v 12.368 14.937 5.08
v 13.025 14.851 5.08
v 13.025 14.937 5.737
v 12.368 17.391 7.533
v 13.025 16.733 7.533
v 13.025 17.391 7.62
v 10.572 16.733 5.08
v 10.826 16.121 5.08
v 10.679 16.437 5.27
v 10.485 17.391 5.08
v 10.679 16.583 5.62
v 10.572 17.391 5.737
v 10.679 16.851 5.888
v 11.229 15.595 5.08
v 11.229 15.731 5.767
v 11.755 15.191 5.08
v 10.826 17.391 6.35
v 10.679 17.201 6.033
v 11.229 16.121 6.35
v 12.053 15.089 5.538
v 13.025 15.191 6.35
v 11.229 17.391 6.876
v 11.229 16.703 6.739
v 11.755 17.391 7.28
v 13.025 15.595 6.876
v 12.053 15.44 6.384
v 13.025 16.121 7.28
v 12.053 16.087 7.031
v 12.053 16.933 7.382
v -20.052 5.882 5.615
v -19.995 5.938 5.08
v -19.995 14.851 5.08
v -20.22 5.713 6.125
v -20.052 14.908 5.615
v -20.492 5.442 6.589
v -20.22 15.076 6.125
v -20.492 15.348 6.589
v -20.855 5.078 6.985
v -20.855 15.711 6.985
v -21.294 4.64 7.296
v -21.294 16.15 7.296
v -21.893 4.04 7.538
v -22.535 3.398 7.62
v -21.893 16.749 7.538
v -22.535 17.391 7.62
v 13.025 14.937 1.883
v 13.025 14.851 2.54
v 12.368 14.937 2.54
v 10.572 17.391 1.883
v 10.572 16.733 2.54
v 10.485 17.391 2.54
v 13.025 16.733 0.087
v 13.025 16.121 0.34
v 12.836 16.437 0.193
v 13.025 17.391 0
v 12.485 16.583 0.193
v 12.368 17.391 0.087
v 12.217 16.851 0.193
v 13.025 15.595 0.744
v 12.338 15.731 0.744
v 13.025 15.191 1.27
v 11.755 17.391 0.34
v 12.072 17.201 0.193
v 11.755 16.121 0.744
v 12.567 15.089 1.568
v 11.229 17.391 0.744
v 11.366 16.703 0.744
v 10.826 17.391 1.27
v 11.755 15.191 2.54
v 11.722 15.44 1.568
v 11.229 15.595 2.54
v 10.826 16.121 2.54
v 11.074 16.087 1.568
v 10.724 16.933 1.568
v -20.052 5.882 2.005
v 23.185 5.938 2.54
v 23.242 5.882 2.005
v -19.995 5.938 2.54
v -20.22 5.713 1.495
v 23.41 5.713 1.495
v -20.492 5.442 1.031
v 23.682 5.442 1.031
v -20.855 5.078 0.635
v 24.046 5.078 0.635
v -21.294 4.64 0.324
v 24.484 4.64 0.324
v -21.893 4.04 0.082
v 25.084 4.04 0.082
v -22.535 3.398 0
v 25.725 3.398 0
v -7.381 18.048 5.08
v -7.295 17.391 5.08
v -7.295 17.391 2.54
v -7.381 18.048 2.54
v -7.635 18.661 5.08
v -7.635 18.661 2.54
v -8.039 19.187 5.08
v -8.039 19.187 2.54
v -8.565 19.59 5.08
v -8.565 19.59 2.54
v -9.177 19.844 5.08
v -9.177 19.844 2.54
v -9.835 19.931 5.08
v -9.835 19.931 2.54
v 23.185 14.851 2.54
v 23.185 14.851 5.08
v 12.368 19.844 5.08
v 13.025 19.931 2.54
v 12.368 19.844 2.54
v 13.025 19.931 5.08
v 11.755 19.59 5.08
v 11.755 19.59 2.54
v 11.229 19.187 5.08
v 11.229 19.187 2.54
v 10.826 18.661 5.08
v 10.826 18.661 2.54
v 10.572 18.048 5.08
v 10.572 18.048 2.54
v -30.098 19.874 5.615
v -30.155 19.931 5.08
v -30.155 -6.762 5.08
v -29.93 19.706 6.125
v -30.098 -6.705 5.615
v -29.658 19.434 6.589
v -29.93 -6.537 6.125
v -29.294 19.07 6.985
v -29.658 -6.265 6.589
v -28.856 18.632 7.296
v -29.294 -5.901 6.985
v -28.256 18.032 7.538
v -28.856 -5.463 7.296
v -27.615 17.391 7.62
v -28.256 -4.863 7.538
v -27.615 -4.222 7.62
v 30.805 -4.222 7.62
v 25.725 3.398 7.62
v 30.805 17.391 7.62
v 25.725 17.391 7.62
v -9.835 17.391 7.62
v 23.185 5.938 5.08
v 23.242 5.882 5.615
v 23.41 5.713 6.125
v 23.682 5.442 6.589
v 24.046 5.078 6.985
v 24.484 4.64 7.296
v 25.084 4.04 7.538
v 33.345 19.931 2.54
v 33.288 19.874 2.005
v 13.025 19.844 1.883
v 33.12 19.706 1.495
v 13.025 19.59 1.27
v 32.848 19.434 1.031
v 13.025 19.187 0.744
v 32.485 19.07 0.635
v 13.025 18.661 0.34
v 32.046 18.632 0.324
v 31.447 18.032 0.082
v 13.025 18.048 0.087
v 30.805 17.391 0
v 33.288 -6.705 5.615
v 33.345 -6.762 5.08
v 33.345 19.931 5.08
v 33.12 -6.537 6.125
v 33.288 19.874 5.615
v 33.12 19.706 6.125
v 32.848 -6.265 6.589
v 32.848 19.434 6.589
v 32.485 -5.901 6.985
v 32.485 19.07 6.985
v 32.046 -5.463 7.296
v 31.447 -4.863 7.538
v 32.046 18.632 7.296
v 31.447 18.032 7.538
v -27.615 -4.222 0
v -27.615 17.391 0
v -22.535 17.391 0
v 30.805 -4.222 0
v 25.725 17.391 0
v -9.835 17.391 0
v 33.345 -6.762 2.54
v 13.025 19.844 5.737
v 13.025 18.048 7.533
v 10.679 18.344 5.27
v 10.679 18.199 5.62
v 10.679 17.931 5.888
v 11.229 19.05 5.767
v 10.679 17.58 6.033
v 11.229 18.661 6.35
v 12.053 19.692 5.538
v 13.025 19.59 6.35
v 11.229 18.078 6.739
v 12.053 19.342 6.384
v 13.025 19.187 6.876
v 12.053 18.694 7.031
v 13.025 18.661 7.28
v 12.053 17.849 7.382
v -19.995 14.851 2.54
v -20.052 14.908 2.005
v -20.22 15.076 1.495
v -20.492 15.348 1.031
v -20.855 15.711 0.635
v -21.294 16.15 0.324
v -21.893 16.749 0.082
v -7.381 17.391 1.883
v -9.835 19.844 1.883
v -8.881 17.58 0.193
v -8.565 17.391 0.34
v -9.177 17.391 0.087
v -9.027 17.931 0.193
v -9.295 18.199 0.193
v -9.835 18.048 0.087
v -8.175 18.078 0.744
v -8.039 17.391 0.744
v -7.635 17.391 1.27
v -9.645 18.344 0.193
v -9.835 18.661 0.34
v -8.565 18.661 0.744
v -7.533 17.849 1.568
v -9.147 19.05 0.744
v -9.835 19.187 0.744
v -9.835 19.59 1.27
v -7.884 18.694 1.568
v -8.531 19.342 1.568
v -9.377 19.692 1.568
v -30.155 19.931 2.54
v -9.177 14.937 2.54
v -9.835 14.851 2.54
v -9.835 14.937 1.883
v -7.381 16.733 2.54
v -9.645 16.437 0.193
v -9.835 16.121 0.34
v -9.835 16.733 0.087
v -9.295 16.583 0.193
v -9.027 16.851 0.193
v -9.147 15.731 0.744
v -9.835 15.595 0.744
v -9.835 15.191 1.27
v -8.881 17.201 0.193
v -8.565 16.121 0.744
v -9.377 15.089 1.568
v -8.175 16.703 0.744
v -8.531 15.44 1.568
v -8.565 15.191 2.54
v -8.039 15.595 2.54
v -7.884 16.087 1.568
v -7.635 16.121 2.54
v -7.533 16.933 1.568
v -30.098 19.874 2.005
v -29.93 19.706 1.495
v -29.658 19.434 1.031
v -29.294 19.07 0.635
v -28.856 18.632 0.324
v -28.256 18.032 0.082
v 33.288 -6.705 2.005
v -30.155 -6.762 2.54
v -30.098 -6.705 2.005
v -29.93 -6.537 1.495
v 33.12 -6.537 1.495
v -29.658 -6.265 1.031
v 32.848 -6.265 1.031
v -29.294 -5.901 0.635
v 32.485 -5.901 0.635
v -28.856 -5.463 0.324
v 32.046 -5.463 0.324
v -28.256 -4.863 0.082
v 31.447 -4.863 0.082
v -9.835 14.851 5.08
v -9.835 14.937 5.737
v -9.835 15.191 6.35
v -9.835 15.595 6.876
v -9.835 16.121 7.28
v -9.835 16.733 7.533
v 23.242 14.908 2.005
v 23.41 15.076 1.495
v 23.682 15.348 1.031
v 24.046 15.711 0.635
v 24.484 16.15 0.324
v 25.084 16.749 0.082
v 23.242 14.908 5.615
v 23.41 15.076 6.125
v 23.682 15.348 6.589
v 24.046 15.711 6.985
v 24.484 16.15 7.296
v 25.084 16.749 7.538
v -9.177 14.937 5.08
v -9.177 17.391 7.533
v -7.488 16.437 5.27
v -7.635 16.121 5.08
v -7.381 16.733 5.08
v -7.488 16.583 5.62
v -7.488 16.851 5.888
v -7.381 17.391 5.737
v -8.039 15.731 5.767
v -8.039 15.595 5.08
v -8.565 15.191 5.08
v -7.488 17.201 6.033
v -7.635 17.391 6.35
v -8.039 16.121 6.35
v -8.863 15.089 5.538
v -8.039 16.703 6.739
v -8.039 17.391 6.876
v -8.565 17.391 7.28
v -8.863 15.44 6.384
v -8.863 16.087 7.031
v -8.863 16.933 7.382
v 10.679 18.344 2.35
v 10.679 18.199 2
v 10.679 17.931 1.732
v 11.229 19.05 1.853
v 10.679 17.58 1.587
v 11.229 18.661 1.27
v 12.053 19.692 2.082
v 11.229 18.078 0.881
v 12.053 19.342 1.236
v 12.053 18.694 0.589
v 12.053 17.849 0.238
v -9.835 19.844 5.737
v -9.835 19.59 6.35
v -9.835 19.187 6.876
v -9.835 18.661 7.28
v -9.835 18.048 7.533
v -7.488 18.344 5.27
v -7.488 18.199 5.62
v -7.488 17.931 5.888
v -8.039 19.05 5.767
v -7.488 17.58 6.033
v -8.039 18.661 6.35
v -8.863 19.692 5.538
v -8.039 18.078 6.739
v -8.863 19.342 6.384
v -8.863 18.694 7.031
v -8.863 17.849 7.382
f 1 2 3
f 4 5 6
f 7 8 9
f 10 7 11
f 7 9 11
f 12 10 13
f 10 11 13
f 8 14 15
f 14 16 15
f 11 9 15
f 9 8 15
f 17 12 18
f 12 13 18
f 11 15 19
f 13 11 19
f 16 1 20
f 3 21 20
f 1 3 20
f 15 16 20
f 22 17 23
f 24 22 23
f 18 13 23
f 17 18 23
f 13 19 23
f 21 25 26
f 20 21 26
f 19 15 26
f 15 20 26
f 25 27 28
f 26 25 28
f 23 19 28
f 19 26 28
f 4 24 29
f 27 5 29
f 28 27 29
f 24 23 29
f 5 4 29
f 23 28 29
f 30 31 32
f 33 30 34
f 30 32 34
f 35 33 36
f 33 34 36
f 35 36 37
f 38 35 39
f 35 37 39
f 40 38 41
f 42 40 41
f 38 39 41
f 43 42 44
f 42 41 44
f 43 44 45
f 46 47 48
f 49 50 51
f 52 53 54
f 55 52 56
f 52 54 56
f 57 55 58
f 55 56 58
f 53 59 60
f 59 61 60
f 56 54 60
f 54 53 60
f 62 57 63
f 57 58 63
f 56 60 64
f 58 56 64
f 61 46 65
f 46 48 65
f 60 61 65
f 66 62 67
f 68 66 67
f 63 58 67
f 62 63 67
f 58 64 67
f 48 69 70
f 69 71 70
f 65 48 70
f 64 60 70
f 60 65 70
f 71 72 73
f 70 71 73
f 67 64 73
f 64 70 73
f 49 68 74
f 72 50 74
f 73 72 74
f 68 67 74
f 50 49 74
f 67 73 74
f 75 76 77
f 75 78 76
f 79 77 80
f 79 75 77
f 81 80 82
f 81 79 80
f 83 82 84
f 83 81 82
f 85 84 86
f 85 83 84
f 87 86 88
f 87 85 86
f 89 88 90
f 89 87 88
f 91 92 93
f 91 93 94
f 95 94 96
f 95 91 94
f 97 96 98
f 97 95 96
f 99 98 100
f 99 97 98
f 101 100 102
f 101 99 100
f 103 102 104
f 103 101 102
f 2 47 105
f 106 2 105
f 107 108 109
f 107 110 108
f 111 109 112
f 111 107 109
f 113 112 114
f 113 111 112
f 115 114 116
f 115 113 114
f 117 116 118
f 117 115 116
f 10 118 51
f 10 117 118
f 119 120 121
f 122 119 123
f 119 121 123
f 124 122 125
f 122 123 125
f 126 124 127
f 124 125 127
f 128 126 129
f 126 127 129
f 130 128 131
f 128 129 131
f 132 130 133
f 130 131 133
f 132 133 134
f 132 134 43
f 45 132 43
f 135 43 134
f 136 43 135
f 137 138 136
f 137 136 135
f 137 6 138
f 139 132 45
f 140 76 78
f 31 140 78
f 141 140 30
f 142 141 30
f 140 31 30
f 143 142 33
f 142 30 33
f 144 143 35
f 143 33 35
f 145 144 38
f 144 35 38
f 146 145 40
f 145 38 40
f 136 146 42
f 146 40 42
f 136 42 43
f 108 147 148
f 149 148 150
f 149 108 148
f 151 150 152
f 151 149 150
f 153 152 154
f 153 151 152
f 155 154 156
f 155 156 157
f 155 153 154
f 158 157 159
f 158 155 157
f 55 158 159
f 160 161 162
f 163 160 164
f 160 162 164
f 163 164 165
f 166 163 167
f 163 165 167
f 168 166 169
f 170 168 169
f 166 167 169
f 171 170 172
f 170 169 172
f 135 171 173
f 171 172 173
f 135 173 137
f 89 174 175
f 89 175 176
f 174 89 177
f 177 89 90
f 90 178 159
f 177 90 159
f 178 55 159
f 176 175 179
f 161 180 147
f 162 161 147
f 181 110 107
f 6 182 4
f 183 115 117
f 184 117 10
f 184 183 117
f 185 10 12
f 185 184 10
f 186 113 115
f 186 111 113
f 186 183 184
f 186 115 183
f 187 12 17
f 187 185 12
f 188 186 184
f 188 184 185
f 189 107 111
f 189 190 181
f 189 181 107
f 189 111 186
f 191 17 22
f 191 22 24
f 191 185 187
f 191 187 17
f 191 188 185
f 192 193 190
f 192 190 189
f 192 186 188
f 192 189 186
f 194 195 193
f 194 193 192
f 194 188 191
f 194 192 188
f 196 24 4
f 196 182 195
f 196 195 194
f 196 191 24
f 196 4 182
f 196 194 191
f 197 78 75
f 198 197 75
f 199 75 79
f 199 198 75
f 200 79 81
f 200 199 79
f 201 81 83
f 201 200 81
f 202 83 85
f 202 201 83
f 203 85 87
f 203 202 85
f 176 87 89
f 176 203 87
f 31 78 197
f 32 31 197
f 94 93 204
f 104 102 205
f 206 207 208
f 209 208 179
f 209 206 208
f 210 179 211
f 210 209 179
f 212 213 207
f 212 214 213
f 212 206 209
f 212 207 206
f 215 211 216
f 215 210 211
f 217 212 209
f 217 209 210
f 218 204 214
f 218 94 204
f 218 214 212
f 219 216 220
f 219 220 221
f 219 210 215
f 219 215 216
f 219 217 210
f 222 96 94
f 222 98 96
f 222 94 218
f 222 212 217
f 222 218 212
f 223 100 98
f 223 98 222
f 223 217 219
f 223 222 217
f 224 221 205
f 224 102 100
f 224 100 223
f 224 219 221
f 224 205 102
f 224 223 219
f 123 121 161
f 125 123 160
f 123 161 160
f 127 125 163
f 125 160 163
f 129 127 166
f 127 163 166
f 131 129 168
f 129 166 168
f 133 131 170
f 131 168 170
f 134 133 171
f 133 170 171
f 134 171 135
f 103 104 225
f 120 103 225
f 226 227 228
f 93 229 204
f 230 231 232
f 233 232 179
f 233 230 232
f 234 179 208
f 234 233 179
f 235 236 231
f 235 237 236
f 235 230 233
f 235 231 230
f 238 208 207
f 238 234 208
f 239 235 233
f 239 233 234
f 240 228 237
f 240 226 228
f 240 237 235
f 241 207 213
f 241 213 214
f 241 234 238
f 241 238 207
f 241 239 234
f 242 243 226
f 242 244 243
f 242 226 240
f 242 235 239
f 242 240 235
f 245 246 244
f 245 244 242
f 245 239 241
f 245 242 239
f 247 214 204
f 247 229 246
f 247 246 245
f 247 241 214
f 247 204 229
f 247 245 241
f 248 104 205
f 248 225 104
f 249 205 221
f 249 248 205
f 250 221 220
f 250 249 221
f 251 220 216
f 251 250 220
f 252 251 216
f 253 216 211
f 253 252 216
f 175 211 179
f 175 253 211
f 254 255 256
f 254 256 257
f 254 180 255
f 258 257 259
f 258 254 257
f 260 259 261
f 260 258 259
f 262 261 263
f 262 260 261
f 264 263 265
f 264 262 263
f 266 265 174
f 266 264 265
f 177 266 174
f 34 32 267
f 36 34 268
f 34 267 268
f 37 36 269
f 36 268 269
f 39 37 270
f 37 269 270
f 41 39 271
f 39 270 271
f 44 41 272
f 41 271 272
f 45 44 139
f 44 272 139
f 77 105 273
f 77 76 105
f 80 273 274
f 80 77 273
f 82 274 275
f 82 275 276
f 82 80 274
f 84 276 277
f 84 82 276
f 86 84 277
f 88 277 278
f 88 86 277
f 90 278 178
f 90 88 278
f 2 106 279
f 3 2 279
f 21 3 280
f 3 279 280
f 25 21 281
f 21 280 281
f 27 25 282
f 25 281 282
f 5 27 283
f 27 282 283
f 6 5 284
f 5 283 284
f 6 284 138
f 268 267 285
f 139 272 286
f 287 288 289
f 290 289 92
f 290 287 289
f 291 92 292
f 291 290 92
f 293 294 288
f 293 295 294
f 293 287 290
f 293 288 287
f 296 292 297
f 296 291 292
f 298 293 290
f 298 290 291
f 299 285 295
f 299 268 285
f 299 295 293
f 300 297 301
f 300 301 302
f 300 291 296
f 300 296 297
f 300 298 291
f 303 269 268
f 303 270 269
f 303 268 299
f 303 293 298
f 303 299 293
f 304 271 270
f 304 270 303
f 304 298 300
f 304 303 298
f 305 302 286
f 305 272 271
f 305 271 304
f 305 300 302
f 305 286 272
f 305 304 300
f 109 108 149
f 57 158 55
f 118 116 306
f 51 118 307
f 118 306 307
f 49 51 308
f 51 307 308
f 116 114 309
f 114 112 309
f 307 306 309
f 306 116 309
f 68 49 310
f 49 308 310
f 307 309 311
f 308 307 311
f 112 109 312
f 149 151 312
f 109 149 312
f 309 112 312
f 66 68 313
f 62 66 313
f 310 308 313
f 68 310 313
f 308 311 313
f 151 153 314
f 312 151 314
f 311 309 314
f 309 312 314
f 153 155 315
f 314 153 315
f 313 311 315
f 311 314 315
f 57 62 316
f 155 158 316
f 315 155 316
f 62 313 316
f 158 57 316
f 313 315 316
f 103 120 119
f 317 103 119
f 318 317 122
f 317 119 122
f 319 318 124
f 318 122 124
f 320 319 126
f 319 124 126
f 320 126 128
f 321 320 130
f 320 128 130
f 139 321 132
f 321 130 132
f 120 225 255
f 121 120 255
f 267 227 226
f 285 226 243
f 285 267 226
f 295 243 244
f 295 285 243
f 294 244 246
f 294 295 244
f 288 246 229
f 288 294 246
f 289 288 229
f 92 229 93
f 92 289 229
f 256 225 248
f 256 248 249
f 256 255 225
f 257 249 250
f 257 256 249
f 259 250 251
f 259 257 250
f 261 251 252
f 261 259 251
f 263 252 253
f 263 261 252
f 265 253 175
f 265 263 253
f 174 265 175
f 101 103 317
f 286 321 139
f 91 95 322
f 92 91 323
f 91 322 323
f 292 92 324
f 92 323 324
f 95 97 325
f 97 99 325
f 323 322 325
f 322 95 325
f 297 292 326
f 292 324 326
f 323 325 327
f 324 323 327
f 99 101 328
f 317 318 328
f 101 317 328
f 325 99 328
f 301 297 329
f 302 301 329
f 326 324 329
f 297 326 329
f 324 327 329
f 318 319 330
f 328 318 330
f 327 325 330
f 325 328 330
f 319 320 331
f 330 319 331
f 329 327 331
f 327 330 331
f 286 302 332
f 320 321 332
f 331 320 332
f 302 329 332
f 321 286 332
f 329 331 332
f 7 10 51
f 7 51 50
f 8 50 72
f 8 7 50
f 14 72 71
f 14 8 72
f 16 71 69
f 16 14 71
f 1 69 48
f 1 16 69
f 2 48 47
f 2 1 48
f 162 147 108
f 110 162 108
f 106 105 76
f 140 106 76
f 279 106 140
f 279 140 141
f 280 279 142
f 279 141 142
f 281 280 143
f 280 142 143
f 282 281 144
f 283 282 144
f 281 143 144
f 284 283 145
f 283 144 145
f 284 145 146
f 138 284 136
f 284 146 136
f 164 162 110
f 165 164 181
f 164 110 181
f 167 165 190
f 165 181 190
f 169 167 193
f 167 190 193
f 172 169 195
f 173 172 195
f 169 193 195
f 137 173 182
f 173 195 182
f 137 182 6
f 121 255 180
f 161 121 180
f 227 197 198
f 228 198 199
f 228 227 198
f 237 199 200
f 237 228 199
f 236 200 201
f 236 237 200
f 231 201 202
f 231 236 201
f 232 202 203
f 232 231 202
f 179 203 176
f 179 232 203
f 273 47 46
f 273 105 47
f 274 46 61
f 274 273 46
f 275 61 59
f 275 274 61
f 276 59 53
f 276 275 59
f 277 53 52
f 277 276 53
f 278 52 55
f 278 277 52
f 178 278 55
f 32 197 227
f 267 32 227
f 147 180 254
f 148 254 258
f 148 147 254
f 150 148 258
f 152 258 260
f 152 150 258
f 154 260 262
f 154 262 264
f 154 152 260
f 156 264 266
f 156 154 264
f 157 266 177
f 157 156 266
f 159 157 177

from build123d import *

# Parameters (mm, degrees)
F0_W     = 12.7
F0_H     = 5.08
F1_DEPTH = 7.62
F2_R     = 2.53999


# Not quite as in the source:
# - a fillet or chamfer is up to 0.001 mm smaller than in the source, because OpenCascade refuses the exact size


with BuildPart() as f1:
    # F0 (on Top) → F1 (new body)
    with BuildSketch(Plane.XY):
        Polygon((-30.1547096223, 19.9307221919), (-30.1547096223, 5.9384261601), (-19.9947096223, 5.9384261601), (-19.9947096223, 14.8507221919), (-19.9947096223, 19.9307221919), align=None)
        Polygon((-19.9947096223, 5.9384261601), (-30.1547096223, 5.9384261601), (-30.1547096223, -6.7615738399), (33.3452903777, -6.7615738399), (33.3452903777, 5.9384261601), (23.1852903777, 5.9384261601), align=None)
        Polygon((23.1852903777, 14.8507221919), (23.1852903777, 5.9384261601), (33.3452903777, 5.9384261601), (33.3452903777, 19.9307221919), (23.1852903777, 19.9307221919), align=None)
        with Locations((-13.6447096223, 17.3907221919)):
            Rectangle(F0_W, F0_H)
        with Locations((16.8352903777, 17.3907221919)):
            Rectangle(F0_W, F0_H)
    extrude(amount=F1_DEPTH)

    # F2 (radius 2.54 in the source; OpenCascade refuses exactly that, so slightly less here)
    f2_edges = [f1.edges().sort_by_distance(p)[0] for p in [
        (1.59529, -6.761574, 7.62),
        (1.59529, 5.938426, 7.62),
        (-30.15471, 6.584574, 7.62),
        (33.34529, 6.584574, 7.62),
        (21.91529, 19.930722, 7.62),
        (-18.72471, 19.930722, 7.62),
        (21.91529, 19.930722, 0),
        (23.18529, 10.394574, 7.62),
        (16.83529, 14.850722, 7.62),
        (-13.64471, 14.850722, 7.62),
        (1.59529, -6.761574, 0),
        (-30.15471, 6.584574, 0),
        (33.34529, 6.584574, 0),
        (10.48529, 14.850722, 3.81),
        (10.48529, 19.930722, 3.81),
        (-7.29471, 14.850722, 3.81),
        (-7.29471, 19.930722, 3.81),
        (-19.99471, 10.394574, 7.62),
        (1.59529, 5.938426, 0),
        (-19.99471, 10.394574, 0),
        (16.83529, 14.850722, 0),
        (23.18529, 10.394574, 0),
        (-13.64471, 14.850722, 0),
        (10.48529, 17.390722, 0),
        (-7.29471, 17.390722, 0),
        (-18.72471, 19.930722, 0),
        (10.48529, 17.390722, 7.62),
        (-7.29471, 17.390722, 7.62),
    ]]
    fillet(f2_edges, radius=F2_R)


solid = f1.part
